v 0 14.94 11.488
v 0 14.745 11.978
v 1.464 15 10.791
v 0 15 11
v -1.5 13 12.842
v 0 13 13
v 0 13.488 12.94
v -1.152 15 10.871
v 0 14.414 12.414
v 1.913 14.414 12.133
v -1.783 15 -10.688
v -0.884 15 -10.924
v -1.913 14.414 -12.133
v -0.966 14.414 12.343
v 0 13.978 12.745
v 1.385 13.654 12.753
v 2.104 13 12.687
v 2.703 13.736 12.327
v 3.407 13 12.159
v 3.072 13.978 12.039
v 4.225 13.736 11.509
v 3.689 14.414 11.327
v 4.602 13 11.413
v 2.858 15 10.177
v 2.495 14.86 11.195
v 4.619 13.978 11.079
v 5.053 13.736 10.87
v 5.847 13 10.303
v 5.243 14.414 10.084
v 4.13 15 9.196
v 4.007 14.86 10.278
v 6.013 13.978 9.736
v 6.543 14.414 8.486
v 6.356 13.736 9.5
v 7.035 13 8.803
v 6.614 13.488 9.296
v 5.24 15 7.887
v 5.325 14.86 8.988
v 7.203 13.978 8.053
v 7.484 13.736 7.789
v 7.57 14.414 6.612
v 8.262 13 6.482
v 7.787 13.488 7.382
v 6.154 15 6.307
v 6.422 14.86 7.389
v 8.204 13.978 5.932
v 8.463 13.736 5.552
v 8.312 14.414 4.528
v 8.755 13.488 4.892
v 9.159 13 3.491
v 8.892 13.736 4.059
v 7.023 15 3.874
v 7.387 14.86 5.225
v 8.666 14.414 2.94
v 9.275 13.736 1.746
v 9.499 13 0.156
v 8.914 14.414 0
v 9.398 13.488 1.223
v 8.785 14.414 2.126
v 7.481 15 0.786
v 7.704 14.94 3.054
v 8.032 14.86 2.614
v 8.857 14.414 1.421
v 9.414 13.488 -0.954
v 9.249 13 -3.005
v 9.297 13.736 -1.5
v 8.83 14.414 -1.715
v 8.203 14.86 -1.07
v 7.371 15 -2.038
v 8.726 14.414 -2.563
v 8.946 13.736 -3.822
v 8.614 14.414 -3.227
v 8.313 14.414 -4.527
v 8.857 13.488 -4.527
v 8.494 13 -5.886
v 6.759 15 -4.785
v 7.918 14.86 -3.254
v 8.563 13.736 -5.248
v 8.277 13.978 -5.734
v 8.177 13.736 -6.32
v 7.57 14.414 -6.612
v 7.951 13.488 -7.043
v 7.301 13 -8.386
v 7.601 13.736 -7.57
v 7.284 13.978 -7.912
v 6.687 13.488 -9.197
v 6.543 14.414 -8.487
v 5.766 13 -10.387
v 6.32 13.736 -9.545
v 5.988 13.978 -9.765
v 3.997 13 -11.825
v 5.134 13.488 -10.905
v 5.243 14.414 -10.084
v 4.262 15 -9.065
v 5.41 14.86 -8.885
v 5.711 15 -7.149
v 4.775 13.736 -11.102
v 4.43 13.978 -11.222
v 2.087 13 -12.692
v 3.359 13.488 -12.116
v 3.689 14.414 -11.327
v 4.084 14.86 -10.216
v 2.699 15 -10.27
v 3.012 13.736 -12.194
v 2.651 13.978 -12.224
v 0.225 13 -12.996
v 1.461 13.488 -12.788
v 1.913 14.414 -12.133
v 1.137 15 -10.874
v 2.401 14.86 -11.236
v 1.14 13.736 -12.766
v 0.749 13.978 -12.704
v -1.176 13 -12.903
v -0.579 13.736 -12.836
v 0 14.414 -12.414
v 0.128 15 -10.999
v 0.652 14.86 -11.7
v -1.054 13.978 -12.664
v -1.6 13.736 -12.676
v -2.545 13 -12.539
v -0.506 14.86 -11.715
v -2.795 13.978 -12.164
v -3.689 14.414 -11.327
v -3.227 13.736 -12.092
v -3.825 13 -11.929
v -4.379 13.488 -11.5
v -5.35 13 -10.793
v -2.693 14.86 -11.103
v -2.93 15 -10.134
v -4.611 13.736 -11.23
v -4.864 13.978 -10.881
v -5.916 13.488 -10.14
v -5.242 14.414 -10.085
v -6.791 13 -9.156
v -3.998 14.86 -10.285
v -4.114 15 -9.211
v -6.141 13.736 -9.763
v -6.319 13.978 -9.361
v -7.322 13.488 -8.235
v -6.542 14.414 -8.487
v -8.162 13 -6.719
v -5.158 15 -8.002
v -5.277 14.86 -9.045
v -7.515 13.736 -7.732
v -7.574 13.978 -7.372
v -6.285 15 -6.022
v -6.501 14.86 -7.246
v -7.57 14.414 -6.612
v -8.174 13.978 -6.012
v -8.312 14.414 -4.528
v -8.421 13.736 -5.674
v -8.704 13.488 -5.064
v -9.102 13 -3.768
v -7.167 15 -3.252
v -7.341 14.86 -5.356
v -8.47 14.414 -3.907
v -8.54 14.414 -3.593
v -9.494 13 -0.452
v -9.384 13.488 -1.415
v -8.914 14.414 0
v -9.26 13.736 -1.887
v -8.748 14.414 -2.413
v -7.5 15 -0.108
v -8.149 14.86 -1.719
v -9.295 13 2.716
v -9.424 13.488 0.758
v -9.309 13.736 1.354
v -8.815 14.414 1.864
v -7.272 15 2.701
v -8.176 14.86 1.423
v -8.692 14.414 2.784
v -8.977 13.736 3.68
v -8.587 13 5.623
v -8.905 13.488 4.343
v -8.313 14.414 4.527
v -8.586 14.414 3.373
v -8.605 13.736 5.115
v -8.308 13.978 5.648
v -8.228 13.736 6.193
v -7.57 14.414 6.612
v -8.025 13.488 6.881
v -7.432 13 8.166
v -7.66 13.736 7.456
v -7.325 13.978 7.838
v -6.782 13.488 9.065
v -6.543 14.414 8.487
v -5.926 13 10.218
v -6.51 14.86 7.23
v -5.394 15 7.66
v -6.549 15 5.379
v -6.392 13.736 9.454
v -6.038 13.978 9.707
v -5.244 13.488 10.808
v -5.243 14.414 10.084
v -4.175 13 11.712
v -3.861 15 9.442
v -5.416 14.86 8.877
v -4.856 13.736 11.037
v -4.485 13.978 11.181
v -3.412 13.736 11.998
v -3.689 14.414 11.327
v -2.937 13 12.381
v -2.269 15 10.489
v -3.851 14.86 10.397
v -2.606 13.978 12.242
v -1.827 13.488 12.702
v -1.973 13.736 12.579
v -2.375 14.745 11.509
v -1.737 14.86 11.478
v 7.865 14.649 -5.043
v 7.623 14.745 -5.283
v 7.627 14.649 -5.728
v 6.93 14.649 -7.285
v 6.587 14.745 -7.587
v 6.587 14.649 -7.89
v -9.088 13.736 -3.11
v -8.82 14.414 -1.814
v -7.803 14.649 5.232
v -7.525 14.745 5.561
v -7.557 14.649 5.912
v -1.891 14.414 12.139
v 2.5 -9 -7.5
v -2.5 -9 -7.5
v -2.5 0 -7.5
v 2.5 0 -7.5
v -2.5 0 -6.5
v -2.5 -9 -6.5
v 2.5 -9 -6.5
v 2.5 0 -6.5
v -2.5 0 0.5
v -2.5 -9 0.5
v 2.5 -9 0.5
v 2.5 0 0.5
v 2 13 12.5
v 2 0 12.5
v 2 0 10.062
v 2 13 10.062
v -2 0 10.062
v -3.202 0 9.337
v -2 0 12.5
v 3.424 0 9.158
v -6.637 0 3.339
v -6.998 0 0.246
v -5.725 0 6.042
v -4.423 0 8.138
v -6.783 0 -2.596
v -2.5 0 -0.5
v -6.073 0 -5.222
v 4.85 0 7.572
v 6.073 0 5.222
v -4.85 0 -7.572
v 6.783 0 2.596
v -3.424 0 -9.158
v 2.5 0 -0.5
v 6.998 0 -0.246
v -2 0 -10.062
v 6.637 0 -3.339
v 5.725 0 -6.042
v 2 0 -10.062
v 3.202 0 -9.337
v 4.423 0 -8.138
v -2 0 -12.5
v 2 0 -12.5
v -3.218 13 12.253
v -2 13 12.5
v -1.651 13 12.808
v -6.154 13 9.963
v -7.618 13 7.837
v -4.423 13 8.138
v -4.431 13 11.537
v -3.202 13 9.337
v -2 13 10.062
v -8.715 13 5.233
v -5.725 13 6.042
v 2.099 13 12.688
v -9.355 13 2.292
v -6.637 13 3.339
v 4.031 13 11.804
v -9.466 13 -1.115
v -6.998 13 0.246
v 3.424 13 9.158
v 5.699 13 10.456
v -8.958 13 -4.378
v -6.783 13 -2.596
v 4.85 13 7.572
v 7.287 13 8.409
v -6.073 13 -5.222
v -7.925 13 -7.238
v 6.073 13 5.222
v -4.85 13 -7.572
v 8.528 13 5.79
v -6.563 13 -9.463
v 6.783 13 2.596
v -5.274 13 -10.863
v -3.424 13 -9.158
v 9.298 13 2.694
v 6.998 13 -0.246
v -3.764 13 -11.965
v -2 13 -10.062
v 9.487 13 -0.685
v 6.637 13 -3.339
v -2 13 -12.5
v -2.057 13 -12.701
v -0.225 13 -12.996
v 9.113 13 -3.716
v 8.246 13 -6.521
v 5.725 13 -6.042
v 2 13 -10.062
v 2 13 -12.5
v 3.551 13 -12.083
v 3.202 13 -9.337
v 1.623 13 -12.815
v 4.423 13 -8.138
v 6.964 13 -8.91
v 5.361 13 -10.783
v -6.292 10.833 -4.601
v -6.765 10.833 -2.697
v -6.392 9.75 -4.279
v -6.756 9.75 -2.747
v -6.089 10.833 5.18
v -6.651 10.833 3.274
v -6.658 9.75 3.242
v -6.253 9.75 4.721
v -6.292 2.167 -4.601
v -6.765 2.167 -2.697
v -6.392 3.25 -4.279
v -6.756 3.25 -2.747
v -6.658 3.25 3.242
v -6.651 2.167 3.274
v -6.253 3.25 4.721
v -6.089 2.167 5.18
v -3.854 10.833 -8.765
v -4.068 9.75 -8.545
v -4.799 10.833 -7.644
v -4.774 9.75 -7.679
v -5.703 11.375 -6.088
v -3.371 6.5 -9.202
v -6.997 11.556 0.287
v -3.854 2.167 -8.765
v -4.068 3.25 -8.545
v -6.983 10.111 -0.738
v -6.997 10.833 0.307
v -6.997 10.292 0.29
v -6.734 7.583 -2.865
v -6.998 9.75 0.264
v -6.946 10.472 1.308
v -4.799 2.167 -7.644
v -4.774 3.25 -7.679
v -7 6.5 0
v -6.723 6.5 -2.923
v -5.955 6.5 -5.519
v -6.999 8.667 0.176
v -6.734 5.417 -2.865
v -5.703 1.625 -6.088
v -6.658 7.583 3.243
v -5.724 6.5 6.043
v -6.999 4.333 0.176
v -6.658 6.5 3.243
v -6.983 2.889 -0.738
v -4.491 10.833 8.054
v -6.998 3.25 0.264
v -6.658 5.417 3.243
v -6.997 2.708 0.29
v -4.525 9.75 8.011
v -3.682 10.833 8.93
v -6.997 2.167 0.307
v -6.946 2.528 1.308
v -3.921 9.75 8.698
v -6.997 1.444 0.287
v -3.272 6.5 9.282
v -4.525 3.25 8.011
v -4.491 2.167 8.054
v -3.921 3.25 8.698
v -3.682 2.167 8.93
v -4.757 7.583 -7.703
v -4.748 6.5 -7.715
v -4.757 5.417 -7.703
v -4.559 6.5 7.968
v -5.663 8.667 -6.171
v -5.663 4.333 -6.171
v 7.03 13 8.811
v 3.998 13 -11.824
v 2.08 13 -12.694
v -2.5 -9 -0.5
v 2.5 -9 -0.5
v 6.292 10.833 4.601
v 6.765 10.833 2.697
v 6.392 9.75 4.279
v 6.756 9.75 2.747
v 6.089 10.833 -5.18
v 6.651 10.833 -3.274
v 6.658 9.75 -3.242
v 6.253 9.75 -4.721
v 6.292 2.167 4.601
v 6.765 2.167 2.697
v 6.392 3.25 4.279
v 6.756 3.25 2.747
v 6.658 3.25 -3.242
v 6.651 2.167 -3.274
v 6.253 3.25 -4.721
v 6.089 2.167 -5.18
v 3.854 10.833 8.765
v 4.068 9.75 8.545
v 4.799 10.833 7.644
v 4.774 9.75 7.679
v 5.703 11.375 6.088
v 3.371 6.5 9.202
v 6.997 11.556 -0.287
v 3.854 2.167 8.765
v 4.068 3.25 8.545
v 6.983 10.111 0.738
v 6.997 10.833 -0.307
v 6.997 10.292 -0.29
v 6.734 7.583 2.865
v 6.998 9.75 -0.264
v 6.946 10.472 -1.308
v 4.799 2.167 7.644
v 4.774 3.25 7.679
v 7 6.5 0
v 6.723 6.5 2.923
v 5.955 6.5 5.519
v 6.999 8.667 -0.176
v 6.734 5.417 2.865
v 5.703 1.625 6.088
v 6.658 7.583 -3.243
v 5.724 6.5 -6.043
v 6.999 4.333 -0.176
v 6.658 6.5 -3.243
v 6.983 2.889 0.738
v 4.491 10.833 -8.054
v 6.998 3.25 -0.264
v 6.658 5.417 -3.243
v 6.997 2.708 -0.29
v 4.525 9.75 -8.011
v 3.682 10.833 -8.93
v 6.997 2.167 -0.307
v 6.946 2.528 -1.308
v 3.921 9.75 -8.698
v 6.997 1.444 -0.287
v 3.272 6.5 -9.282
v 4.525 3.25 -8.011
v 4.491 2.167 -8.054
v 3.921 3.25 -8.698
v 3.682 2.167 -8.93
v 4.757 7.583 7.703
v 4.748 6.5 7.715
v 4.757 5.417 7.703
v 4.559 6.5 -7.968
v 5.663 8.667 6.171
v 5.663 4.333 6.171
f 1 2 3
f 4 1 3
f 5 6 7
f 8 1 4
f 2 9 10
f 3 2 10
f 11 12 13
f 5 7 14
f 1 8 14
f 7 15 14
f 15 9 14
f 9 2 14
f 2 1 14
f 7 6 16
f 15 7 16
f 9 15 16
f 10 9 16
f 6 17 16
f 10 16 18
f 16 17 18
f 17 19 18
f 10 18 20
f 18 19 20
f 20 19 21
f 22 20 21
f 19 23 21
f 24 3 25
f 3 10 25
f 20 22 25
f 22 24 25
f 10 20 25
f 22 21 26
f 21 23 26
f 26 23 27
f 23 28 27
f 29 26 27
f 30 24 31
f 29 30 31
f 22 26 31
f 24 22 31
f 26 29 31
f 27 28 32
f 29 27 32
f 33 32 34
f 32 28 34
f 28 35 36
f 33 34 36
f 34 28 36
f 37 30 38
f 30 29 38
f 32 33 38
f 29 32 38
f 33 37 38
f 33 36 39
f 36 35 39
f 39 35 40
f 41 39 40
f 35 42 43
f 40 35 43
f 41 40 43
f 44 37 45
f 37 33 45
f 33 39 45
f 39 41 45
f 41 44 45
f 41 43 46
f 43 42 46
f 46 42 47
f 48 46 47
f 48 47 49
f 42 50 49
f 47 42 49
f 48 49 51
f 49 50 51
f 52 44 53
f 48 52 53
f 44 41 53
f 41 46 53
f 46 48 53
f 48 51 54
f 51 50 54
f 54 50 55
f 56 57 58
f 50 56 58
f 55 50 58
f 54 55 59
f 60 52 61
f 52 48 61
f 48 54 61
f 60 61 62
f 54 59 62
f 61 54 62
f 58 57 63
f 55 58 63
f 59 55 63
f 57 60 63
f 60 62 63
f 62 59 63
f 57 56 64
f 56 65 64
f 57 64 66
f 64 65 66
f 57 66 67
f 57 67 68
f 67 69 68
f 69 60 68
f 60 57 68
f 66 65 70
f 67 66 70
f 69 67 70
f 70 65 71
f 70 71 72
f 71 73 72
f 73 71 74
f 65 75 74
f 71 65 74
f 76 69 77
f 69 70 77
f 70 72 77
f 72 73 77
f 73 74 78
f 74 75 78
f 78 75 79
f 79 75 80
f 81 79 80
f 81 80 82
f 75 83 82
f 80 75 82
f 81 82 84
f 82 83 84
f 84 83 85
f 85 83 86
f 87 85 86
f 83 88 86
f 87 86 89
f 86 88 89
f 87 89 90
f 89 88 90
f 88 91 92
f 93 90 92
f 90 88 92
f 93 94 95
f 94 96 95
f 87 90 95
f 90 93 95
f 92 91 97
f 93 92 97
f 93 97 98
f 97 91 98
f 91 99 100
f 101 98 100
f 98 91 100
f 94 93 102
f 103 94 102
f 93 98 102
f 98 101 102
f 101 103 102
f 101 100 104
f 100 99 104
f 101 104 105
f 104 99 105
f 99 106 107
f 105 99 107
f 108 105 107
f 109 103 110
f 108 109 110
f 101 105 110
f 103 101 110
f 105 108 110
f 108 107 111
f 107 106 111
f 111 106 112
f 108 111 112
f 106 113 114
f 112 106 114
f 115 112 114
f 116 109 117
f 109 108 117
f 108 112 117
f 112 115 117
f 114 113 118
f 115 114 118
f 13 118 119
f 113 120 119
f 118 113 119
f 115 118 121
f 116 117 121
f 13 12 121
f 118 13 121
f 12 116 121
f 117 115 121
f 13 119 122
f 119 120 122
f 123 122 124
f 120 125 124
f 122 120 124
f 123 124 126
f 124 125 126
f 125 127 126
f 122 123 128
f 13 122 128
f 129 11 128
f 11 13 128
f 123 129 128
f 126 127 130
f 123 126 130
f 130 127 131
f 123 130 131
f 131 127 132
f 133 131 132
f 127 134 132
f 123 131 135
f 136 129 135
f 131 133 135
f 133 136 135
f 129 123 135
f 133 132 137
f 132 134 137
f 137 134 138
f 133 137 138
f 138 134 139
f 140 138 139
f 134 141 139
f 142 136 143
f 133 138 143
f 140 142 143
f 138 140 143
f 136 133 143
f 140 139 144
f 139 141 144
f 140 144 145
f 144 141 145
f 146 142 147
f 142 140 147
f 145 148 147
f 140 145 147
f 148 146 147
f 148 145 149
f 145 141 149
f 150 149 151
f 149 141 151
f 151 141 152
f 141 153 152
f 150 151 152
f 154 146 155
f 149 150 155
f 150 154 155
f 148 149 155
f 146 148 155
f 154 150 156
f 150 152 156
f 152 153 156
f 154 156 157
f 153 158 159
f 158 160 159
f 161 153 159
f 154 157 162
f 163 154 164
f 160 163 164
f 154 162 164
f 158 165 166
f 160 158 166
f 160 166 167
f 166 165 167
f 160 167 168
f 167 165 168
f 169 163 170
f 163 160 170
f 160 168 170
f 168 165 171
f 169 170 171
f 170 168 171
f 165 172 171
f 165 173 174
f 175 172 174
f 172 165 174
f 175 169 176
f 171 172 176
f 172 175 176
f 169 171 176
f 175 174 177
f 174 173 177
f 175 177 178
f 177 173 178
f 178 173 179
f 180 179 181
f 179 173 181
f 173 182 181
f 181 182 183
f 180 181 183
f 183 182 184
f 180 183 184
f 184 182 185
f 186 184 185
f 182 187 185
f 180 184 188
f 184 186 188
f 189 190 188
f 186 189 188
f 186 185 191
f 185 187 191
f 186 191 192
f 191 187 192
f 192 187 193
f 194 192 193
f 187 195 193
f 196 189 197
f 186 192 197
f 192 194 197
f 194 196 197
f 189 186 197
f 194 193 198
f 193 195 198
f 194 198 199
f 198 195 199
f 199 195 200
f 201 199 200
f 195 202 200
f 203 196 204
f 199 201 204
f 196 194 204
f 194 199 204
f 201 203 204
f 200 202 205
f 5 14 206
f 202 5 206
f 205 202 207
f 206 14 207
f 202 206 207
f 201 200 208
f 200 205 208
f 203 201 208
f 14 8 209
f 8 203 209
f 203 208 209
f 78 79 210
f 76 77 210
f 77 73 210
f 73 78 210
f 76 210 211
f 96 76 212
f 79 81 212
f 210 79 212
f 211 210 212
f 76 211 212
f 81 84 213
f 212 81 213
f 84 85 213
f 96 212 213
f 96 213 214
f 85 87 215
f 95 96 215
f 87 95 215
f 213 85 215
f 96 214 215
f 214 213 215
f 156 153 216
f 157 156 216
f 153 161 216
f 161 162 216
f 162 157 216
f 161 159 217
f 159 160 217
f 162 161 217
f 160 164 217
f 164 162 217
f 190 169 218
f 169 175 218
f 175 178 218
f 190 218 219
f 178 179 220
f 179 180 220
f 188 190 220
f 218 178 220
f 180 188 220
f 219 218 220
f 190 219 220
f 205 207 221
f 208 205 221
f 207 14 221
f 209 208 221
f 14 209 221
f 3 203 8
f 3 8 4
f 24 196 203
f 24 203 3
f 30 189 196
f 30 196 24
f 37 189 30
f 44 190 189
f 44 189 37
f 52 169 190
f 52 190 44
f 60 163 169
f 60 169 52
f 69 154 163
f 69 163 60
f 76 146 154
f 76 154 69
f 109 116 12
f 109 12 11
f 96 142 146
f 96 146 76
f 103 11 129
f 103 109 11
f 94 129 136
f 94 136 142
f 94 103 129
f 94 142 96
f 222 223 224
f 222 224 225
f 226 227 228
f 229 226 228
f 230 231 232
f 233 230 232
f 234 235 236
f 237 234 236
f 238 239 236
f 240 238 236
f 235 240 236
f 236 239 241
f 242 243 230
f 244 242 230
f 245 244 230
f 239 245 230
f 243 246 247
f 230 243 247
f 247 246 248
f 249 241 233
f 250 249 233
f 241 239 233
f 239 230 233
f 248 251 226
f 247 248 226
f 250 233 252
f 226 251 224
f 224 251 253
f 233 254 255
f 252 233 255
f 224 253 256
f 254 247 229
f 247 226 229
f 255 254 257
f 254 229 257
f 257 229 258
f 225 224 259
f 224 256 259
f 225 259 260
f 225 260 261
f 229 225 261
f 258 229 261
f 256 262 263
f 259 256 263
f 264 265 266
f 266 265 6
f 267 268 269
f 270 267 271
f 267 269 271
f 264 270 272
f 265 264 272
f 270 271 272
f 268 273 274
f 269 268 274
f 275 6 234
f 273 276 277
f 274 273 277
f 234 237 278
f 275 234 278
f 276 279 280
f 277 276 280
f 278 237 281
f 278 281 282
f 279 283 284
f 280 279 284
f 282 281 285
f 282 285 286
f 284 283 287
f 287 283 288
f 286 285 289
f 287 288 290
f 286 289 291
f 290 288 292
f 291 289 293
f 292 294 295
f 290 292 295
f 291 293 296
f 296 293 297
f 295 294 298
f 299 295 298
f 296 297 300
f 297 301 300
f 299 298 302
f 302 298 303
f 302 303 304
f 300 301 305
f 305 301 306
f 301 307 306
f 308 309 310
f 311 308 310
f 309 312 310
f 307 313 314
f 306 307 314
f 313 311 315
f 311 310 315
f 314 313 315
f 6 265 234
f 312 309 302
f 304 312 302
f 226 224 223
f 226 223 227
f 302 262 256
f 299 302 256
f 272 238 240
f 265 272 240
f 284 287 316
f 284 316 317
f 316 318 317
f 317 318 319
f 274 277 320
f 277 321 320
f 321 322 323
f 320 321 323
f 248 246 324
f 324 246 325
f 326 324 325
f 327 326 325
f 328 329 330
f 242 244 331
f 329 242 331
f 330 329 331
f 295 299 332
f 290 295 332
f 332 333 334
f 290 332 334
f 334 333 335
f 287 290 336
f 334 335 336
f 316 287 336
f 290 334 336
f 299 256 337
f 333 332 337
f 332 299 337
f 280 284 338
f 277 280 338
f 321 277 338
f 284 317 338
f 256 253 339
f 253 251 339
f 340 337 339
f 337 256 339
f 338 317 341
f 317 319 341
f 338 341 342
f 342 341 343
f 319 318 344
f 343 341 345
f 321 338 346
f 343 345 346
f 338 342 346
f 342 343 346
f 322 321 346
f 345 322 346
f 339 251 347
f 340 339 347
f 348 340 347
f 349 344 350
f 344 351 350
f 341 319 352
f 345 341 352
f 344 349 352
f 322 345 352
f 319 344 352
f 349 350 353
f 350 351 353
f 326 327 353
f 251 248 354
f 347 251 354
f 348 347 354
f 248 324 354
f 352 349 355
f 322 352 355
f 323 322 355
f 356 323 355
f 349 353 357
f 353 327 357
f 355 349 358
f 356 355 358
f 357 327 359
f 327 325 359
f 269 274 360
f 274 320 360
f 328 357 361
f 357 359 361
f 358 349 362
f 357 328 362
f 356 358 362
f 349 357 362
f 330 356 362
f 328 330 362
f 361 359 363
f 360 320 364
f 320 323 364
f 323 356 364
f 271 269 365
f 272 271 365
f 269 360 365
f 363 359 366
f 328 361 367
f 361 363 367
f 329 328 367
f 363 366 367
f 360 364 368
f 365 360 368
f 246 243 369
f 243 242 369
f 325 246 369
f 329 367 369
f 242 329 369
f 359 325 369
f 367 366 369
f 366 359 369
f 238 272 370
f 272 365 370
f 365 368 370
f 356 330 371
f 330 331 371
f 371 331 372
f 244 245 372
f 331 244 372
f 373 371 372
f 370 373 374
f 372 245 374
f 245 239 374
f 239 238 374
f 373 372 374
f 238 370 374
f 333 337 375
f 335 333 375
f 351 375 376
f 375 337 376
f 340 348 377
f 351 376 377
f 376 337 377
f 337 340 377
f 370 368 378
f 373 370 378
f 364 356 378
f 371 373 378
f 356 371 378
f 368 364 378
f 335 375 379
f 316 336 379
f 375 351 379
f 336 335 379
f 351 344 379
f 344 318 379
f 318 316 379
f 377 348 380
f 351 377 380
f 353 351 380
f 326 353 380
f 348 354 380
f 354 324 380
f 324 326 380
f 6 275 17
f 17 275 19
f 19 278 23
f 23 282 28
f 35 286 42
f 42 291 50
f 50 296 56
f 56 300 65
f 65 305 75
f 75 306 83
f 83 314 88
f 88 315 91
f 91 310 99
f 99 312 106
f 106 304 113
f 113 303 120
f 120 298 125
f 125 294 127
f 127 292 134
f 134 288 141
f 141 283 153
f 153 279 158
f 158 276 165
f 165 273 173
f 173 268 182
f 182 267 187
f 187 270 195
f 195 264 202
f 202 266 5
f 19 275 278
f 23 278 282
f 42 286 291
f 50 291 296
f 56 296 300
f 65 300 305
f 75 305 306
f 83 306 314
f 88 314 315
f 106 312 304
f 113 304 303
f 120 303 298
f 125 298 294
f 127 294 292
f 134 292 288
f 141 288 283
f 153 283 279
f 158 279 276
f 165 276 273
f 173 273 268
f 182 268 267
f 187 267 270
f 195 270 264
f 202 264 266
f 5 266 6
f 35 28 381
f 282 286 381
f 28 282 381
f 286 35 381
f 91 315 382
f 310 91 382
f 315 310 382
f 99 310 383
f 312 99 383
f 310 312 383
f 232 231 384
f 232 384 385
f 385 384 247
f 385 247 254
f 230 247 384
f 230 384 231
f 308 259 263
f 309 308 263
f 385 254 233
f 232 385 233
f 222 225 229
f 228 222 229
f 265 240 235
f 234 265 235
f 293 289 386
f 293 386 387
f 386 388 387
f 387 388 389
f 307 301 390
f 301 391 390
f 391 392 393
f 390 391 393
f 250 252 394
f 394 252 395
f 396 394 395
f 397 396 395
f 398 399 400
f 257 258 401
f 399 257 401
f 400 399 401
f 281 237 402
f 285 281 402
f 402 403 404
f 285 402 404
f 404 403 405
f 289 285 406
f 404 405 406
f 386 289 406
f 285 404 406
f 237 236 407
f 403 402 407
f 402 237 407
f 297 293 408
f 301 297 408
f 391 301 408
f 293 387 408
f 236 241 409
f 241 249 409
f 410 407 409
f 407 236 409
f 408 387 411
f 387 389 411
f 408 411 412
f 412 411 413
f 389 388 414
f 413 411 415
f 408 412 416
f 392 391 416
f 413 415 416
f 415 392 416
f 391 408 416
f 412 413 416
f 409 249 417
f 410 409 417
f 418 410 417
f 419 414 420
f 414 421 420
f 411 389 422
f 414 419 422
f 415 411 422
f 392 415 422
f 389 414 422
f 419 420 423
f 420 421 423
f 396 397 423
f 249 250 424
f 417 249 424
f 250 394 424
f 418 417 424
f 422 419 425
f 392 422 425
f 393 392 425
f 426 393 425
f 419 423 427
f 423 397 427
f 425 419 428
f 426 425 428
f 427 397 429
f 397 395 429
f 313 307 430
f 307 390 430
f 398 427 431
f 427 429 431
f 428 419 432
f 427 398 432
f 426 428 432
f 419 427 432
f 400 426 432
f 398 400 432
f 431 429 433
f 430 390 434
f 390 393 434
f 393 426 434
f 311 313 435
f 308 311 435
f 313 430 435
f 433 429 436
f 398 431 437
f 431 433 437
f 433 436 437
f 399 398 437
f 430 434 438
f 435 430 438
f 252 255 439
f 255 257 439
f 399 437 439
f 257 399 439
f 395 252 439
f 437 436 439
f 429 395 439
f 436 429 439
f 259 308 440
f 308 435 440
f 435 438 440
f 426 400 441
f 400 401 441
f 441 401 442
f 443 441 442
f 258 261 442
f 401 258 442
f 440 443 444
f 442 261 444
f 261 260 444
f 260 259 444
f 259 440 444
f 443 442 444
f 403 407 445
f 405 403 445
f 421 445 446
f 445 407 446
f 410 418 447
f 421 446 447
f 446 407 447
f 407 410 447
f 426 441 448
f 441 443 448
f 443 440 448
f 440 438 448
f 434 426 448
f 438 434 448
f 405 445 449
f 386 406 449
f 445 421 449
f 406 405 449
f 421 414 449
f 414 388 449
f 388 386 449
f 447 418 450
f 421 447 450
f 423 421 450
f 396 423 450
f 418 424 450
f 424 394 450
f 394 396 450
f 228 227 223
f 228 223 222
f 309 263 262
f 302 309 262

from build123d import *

# Parameters (mm, degrees)
BOSS_EXTRU_1_DEPTH = 13
BOSS_EXTRU_2_DEPTH = 2
CONG_1_R           = 2
ESQUISSE3_W        = 5
ESQUISSE3_H        = 1
BOSS_EXTRU_3_DEPTH = 9


# Read off the part's stored shape, not the designer's step: Boss.-Extru.2
with BuildPart() as part:
    # Esquisse1 → Boss.-Extru.1 (new body)
    with BuildSketch(Plane(origin=(0, 0, 0), x_dir=(1, 0, 0), z_dir=(0, 1, 0))):
        with BuildLine():
            Line((2, 10.062305899), (2, 12.5))
            Line((2, 12.5), (-2, 12.5))
            Line((-2, 12.5), (-2, 10.062305899))
            add(Edge.make_bspline(
                [(-2, 10.062305899), (-24.5, 0), (-2, -10.062305899)],
                knots=[3.431344355, 3.431344355, 3.431344355, 5.993433606, 5.993433606, 5.993433606], degree=2, weights=[1, 0.285714286, 1]))
            Line((-2, -10.062305899), (-2, -12.5))
            Line((-2, -12.5), (2, -12.5))
            Line((2, -12.5), (2, -10.062305899))
            add(Edge.make_bspline(
                [(2, -10.062305899), (24.5, 0), (2, 10.062305899)],
                knots=[0.289751701, 0.289751701, 0.289751701, 2.851840952, 2.851840952, 2.851840952], degree=2, weights=[1, 0.285714286, 1]))
        make_face()
    extrude(amount=BOSS_EXTRU_1_DEPTH)

    # Boss.-Extru.2 outline → Boss.-Extru.2 (add)
    with BuildSketch(Plane(origin=(0, 13, 0), x_dir=(1, 0, 0), z_dir=(0, 1, 0))):
        with BuildLine():
            add(Edge.make_bspline(
                [(0, -13), (0.703240737, -13), (2.109722211, -12.789689498), (4.688231544, -11.602625859), (7.229672734, -8.991447827), (9.080604982, -4.777577384), (9.709697509, 0), (9.080604982, 4.777577384), (7.229672734, 8.991447827), (4.688231544, 11.602625859), (2.109722211, 12.789689498), (0, 13.105155251), (-2.109722211, 12.789689498), (-4.688231544, 11.602625859), (-7.229672734, 8.991447827), (-9.080604982, 4.777577384), (-9.709697509, 0), (-9.080604982, -4.777577384), (-7.229672734, -8.991447827), (-4.688231544, -11.602625859), (-2.109722211, -12.789689498), (-0.703240737, -13), (0, -13)],
                knots=[0, 0, 0, 0, 0.196349541, 0.392699082, 0.785398163, 1.178097245, 1.570796327, 1.963495408, 2.35619449, 2.748893572, 2.945243113, 3.141592654, 3.337942194, 3.534291735, 3.926990817, 4.319689899, 4.71238898, 5.105088062, 5.497787144, 5.890486225, 6.086835766, 6.283185307, 6.283185307, 6.283185307, 6.283185307], degree=3))
        make_face()
    extrude(amount=BOSS_EXTRU_2_DEPTH)

    # Congé1
    cong_1_edges = [part.edges().sort_by_distance(p)[0] for p in [
        (0, 15, -13),
    ]]
    fillet(cong_1_edges, radius=CONG_1_R - 0.0004)  # a hair under: the kernel refuses the full size

    # Esquisse3 → Boss.-Extru.3 (add)
    with BuildSketch(Plane.XZ):
        Rectangle(ESQUISSE3_W, ESQUISSE3_H)
        with Locations((0, -7)):
            Rectangle(ESQUISSE3_W, ESQUISSE3_H)
    extrude(amount=BOSS_EXTRU_3_DEPTH)


solid = part.part
